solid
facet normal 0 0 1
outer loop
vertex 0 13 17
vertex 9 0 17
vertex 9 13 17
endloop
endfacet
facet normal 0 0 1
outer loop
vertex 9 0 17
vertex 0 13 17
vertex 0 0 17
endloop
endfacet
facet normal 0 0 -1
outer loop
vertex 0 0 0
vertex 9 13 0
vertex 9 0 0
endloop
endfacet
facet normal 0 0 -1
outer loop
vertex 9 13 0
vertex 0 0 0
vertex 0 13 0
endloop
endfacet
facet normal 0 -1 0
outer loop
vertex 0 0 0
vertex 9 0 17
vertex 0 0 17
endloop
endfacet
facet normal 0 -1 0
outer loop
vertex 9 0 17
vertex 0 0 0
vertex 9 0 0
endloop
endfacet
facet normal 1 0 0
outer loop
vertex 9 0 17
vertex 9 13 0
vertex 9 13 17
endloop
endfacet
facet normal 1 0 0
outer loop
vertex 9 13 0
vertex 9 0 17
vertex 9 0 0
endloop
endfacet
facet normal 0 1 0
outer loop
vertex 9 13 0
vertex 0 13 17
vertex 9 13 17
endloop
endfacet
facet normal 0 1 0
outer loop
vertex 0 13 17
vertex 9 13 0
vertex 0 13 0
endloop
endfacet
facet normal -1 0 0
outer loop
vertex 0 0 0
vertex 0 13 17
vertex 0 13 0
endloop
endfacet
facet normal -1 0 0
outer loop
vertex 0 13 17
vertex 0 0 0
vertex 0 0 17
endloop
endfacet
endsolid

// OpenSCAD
// Generated by SolidPython 1.0.1 on 2020-07-29 00:46:55


cube(size = [9, 13, 17]);
/***********************************************
*********      SolidPython code:      **********
************************************************
 
# import packages: SolidPython
from solid import *
from solid.utils import *
from itertools import chain, combinations, permutations


class Resize:

    def __init__(self, scad_file):
        self.scad_file = scad_file
        #self.scad_file = import_scad(scad_file)
        # cone/cylinder param:
        self.r1 = 0
        self.r2 = 0
        self.h = 0
        # rectangular prism param:
        self.w = 0
        self.l = 0
        # ellipse param:
        self.r = 0

    # import OpenScad code (file name corresponds to shape)


    # classify shape + parameters
    def assign(self, param1, param2, param3):
        if self.scad_file == 'cone.scad':
            self.r1 = param1
            self.r2 = param2
            self.h = param3
        elif self.scad_file == 'cylinder.scad':
            self.r1 = param1
            self.r2 = param2
            self.h = param3
        elif self.scad_file == 'rectangularPrism.scad':
            self.h = param1
            self.l = param2
            self.w = param3
        else:
            self.r = param1
            self.h = param2

    # resize parameters
    def iterate(self):
        x = range(3, 20, 2)
        i = 1
        if self.scad_file == 'cone.scad':
            tempList = list(permutations(x, 2))
            for temp in tempList:
                param1 = temp[0]
                param2 = temp[1]
                filepath = 'produced_scad_files/' + 'cone' + str(param1) + '_' + str(param2) + '_' + '.scad'
                scad_render_to_file(cylinder(h=param1, r1=param2, r2=0), filepath)

        elif self.scad_file == 'cylinder.scad':
            tempList = list(permutations(x, 3))
            for temp in tempList:
                param1 = temp[0]
                param2 = temp[1]
                filepath = 'produced_scad_files/' + 'cylinder' + str(param1) + '_' + str(param2) + '_' + '.scad'
                scad_render_to_file(cylinder(h=param1, r1=param2, r2=param2), filepath)

        elif self.scad_file == 'rectangularPrism.scad':
            tempList = list(permutations(x, 3))
            for temp in tempList:
                param1 = temp[0]
                param2 = temp[1]
                param3 = temp[2]
                filepath = 'produced_scad_files/' + 'rectangularPrism' + str(param1) + '_' + str(param2) + '_' + str(
                    param3) + '.scad'
                scad_render_to_file(cube(size=(param1, param2, param3)), filepath)

        elif self.scad_file == 'ellipse.scad':
            tempList = list(permutations(x, 4))
            for temp in tempList:
                param1 = temp[0]
                param2 = temp[1]
                param3 = temp[2]
                param4 = temp[3]
                filepath = 'produced_scad_files/' + 'ellipse' + str(param1) + '_' + str(param2) + '_' + str(param3) + '_' + str(param4) + '.scad'
                scad_render_to_file(scale([param1, param2, param3])(sphere(r=param4)), filepath)

    def render_to_scadfile(self):
        scad_render_to_file(scad, 'example.scad') 
 
************************************************/
